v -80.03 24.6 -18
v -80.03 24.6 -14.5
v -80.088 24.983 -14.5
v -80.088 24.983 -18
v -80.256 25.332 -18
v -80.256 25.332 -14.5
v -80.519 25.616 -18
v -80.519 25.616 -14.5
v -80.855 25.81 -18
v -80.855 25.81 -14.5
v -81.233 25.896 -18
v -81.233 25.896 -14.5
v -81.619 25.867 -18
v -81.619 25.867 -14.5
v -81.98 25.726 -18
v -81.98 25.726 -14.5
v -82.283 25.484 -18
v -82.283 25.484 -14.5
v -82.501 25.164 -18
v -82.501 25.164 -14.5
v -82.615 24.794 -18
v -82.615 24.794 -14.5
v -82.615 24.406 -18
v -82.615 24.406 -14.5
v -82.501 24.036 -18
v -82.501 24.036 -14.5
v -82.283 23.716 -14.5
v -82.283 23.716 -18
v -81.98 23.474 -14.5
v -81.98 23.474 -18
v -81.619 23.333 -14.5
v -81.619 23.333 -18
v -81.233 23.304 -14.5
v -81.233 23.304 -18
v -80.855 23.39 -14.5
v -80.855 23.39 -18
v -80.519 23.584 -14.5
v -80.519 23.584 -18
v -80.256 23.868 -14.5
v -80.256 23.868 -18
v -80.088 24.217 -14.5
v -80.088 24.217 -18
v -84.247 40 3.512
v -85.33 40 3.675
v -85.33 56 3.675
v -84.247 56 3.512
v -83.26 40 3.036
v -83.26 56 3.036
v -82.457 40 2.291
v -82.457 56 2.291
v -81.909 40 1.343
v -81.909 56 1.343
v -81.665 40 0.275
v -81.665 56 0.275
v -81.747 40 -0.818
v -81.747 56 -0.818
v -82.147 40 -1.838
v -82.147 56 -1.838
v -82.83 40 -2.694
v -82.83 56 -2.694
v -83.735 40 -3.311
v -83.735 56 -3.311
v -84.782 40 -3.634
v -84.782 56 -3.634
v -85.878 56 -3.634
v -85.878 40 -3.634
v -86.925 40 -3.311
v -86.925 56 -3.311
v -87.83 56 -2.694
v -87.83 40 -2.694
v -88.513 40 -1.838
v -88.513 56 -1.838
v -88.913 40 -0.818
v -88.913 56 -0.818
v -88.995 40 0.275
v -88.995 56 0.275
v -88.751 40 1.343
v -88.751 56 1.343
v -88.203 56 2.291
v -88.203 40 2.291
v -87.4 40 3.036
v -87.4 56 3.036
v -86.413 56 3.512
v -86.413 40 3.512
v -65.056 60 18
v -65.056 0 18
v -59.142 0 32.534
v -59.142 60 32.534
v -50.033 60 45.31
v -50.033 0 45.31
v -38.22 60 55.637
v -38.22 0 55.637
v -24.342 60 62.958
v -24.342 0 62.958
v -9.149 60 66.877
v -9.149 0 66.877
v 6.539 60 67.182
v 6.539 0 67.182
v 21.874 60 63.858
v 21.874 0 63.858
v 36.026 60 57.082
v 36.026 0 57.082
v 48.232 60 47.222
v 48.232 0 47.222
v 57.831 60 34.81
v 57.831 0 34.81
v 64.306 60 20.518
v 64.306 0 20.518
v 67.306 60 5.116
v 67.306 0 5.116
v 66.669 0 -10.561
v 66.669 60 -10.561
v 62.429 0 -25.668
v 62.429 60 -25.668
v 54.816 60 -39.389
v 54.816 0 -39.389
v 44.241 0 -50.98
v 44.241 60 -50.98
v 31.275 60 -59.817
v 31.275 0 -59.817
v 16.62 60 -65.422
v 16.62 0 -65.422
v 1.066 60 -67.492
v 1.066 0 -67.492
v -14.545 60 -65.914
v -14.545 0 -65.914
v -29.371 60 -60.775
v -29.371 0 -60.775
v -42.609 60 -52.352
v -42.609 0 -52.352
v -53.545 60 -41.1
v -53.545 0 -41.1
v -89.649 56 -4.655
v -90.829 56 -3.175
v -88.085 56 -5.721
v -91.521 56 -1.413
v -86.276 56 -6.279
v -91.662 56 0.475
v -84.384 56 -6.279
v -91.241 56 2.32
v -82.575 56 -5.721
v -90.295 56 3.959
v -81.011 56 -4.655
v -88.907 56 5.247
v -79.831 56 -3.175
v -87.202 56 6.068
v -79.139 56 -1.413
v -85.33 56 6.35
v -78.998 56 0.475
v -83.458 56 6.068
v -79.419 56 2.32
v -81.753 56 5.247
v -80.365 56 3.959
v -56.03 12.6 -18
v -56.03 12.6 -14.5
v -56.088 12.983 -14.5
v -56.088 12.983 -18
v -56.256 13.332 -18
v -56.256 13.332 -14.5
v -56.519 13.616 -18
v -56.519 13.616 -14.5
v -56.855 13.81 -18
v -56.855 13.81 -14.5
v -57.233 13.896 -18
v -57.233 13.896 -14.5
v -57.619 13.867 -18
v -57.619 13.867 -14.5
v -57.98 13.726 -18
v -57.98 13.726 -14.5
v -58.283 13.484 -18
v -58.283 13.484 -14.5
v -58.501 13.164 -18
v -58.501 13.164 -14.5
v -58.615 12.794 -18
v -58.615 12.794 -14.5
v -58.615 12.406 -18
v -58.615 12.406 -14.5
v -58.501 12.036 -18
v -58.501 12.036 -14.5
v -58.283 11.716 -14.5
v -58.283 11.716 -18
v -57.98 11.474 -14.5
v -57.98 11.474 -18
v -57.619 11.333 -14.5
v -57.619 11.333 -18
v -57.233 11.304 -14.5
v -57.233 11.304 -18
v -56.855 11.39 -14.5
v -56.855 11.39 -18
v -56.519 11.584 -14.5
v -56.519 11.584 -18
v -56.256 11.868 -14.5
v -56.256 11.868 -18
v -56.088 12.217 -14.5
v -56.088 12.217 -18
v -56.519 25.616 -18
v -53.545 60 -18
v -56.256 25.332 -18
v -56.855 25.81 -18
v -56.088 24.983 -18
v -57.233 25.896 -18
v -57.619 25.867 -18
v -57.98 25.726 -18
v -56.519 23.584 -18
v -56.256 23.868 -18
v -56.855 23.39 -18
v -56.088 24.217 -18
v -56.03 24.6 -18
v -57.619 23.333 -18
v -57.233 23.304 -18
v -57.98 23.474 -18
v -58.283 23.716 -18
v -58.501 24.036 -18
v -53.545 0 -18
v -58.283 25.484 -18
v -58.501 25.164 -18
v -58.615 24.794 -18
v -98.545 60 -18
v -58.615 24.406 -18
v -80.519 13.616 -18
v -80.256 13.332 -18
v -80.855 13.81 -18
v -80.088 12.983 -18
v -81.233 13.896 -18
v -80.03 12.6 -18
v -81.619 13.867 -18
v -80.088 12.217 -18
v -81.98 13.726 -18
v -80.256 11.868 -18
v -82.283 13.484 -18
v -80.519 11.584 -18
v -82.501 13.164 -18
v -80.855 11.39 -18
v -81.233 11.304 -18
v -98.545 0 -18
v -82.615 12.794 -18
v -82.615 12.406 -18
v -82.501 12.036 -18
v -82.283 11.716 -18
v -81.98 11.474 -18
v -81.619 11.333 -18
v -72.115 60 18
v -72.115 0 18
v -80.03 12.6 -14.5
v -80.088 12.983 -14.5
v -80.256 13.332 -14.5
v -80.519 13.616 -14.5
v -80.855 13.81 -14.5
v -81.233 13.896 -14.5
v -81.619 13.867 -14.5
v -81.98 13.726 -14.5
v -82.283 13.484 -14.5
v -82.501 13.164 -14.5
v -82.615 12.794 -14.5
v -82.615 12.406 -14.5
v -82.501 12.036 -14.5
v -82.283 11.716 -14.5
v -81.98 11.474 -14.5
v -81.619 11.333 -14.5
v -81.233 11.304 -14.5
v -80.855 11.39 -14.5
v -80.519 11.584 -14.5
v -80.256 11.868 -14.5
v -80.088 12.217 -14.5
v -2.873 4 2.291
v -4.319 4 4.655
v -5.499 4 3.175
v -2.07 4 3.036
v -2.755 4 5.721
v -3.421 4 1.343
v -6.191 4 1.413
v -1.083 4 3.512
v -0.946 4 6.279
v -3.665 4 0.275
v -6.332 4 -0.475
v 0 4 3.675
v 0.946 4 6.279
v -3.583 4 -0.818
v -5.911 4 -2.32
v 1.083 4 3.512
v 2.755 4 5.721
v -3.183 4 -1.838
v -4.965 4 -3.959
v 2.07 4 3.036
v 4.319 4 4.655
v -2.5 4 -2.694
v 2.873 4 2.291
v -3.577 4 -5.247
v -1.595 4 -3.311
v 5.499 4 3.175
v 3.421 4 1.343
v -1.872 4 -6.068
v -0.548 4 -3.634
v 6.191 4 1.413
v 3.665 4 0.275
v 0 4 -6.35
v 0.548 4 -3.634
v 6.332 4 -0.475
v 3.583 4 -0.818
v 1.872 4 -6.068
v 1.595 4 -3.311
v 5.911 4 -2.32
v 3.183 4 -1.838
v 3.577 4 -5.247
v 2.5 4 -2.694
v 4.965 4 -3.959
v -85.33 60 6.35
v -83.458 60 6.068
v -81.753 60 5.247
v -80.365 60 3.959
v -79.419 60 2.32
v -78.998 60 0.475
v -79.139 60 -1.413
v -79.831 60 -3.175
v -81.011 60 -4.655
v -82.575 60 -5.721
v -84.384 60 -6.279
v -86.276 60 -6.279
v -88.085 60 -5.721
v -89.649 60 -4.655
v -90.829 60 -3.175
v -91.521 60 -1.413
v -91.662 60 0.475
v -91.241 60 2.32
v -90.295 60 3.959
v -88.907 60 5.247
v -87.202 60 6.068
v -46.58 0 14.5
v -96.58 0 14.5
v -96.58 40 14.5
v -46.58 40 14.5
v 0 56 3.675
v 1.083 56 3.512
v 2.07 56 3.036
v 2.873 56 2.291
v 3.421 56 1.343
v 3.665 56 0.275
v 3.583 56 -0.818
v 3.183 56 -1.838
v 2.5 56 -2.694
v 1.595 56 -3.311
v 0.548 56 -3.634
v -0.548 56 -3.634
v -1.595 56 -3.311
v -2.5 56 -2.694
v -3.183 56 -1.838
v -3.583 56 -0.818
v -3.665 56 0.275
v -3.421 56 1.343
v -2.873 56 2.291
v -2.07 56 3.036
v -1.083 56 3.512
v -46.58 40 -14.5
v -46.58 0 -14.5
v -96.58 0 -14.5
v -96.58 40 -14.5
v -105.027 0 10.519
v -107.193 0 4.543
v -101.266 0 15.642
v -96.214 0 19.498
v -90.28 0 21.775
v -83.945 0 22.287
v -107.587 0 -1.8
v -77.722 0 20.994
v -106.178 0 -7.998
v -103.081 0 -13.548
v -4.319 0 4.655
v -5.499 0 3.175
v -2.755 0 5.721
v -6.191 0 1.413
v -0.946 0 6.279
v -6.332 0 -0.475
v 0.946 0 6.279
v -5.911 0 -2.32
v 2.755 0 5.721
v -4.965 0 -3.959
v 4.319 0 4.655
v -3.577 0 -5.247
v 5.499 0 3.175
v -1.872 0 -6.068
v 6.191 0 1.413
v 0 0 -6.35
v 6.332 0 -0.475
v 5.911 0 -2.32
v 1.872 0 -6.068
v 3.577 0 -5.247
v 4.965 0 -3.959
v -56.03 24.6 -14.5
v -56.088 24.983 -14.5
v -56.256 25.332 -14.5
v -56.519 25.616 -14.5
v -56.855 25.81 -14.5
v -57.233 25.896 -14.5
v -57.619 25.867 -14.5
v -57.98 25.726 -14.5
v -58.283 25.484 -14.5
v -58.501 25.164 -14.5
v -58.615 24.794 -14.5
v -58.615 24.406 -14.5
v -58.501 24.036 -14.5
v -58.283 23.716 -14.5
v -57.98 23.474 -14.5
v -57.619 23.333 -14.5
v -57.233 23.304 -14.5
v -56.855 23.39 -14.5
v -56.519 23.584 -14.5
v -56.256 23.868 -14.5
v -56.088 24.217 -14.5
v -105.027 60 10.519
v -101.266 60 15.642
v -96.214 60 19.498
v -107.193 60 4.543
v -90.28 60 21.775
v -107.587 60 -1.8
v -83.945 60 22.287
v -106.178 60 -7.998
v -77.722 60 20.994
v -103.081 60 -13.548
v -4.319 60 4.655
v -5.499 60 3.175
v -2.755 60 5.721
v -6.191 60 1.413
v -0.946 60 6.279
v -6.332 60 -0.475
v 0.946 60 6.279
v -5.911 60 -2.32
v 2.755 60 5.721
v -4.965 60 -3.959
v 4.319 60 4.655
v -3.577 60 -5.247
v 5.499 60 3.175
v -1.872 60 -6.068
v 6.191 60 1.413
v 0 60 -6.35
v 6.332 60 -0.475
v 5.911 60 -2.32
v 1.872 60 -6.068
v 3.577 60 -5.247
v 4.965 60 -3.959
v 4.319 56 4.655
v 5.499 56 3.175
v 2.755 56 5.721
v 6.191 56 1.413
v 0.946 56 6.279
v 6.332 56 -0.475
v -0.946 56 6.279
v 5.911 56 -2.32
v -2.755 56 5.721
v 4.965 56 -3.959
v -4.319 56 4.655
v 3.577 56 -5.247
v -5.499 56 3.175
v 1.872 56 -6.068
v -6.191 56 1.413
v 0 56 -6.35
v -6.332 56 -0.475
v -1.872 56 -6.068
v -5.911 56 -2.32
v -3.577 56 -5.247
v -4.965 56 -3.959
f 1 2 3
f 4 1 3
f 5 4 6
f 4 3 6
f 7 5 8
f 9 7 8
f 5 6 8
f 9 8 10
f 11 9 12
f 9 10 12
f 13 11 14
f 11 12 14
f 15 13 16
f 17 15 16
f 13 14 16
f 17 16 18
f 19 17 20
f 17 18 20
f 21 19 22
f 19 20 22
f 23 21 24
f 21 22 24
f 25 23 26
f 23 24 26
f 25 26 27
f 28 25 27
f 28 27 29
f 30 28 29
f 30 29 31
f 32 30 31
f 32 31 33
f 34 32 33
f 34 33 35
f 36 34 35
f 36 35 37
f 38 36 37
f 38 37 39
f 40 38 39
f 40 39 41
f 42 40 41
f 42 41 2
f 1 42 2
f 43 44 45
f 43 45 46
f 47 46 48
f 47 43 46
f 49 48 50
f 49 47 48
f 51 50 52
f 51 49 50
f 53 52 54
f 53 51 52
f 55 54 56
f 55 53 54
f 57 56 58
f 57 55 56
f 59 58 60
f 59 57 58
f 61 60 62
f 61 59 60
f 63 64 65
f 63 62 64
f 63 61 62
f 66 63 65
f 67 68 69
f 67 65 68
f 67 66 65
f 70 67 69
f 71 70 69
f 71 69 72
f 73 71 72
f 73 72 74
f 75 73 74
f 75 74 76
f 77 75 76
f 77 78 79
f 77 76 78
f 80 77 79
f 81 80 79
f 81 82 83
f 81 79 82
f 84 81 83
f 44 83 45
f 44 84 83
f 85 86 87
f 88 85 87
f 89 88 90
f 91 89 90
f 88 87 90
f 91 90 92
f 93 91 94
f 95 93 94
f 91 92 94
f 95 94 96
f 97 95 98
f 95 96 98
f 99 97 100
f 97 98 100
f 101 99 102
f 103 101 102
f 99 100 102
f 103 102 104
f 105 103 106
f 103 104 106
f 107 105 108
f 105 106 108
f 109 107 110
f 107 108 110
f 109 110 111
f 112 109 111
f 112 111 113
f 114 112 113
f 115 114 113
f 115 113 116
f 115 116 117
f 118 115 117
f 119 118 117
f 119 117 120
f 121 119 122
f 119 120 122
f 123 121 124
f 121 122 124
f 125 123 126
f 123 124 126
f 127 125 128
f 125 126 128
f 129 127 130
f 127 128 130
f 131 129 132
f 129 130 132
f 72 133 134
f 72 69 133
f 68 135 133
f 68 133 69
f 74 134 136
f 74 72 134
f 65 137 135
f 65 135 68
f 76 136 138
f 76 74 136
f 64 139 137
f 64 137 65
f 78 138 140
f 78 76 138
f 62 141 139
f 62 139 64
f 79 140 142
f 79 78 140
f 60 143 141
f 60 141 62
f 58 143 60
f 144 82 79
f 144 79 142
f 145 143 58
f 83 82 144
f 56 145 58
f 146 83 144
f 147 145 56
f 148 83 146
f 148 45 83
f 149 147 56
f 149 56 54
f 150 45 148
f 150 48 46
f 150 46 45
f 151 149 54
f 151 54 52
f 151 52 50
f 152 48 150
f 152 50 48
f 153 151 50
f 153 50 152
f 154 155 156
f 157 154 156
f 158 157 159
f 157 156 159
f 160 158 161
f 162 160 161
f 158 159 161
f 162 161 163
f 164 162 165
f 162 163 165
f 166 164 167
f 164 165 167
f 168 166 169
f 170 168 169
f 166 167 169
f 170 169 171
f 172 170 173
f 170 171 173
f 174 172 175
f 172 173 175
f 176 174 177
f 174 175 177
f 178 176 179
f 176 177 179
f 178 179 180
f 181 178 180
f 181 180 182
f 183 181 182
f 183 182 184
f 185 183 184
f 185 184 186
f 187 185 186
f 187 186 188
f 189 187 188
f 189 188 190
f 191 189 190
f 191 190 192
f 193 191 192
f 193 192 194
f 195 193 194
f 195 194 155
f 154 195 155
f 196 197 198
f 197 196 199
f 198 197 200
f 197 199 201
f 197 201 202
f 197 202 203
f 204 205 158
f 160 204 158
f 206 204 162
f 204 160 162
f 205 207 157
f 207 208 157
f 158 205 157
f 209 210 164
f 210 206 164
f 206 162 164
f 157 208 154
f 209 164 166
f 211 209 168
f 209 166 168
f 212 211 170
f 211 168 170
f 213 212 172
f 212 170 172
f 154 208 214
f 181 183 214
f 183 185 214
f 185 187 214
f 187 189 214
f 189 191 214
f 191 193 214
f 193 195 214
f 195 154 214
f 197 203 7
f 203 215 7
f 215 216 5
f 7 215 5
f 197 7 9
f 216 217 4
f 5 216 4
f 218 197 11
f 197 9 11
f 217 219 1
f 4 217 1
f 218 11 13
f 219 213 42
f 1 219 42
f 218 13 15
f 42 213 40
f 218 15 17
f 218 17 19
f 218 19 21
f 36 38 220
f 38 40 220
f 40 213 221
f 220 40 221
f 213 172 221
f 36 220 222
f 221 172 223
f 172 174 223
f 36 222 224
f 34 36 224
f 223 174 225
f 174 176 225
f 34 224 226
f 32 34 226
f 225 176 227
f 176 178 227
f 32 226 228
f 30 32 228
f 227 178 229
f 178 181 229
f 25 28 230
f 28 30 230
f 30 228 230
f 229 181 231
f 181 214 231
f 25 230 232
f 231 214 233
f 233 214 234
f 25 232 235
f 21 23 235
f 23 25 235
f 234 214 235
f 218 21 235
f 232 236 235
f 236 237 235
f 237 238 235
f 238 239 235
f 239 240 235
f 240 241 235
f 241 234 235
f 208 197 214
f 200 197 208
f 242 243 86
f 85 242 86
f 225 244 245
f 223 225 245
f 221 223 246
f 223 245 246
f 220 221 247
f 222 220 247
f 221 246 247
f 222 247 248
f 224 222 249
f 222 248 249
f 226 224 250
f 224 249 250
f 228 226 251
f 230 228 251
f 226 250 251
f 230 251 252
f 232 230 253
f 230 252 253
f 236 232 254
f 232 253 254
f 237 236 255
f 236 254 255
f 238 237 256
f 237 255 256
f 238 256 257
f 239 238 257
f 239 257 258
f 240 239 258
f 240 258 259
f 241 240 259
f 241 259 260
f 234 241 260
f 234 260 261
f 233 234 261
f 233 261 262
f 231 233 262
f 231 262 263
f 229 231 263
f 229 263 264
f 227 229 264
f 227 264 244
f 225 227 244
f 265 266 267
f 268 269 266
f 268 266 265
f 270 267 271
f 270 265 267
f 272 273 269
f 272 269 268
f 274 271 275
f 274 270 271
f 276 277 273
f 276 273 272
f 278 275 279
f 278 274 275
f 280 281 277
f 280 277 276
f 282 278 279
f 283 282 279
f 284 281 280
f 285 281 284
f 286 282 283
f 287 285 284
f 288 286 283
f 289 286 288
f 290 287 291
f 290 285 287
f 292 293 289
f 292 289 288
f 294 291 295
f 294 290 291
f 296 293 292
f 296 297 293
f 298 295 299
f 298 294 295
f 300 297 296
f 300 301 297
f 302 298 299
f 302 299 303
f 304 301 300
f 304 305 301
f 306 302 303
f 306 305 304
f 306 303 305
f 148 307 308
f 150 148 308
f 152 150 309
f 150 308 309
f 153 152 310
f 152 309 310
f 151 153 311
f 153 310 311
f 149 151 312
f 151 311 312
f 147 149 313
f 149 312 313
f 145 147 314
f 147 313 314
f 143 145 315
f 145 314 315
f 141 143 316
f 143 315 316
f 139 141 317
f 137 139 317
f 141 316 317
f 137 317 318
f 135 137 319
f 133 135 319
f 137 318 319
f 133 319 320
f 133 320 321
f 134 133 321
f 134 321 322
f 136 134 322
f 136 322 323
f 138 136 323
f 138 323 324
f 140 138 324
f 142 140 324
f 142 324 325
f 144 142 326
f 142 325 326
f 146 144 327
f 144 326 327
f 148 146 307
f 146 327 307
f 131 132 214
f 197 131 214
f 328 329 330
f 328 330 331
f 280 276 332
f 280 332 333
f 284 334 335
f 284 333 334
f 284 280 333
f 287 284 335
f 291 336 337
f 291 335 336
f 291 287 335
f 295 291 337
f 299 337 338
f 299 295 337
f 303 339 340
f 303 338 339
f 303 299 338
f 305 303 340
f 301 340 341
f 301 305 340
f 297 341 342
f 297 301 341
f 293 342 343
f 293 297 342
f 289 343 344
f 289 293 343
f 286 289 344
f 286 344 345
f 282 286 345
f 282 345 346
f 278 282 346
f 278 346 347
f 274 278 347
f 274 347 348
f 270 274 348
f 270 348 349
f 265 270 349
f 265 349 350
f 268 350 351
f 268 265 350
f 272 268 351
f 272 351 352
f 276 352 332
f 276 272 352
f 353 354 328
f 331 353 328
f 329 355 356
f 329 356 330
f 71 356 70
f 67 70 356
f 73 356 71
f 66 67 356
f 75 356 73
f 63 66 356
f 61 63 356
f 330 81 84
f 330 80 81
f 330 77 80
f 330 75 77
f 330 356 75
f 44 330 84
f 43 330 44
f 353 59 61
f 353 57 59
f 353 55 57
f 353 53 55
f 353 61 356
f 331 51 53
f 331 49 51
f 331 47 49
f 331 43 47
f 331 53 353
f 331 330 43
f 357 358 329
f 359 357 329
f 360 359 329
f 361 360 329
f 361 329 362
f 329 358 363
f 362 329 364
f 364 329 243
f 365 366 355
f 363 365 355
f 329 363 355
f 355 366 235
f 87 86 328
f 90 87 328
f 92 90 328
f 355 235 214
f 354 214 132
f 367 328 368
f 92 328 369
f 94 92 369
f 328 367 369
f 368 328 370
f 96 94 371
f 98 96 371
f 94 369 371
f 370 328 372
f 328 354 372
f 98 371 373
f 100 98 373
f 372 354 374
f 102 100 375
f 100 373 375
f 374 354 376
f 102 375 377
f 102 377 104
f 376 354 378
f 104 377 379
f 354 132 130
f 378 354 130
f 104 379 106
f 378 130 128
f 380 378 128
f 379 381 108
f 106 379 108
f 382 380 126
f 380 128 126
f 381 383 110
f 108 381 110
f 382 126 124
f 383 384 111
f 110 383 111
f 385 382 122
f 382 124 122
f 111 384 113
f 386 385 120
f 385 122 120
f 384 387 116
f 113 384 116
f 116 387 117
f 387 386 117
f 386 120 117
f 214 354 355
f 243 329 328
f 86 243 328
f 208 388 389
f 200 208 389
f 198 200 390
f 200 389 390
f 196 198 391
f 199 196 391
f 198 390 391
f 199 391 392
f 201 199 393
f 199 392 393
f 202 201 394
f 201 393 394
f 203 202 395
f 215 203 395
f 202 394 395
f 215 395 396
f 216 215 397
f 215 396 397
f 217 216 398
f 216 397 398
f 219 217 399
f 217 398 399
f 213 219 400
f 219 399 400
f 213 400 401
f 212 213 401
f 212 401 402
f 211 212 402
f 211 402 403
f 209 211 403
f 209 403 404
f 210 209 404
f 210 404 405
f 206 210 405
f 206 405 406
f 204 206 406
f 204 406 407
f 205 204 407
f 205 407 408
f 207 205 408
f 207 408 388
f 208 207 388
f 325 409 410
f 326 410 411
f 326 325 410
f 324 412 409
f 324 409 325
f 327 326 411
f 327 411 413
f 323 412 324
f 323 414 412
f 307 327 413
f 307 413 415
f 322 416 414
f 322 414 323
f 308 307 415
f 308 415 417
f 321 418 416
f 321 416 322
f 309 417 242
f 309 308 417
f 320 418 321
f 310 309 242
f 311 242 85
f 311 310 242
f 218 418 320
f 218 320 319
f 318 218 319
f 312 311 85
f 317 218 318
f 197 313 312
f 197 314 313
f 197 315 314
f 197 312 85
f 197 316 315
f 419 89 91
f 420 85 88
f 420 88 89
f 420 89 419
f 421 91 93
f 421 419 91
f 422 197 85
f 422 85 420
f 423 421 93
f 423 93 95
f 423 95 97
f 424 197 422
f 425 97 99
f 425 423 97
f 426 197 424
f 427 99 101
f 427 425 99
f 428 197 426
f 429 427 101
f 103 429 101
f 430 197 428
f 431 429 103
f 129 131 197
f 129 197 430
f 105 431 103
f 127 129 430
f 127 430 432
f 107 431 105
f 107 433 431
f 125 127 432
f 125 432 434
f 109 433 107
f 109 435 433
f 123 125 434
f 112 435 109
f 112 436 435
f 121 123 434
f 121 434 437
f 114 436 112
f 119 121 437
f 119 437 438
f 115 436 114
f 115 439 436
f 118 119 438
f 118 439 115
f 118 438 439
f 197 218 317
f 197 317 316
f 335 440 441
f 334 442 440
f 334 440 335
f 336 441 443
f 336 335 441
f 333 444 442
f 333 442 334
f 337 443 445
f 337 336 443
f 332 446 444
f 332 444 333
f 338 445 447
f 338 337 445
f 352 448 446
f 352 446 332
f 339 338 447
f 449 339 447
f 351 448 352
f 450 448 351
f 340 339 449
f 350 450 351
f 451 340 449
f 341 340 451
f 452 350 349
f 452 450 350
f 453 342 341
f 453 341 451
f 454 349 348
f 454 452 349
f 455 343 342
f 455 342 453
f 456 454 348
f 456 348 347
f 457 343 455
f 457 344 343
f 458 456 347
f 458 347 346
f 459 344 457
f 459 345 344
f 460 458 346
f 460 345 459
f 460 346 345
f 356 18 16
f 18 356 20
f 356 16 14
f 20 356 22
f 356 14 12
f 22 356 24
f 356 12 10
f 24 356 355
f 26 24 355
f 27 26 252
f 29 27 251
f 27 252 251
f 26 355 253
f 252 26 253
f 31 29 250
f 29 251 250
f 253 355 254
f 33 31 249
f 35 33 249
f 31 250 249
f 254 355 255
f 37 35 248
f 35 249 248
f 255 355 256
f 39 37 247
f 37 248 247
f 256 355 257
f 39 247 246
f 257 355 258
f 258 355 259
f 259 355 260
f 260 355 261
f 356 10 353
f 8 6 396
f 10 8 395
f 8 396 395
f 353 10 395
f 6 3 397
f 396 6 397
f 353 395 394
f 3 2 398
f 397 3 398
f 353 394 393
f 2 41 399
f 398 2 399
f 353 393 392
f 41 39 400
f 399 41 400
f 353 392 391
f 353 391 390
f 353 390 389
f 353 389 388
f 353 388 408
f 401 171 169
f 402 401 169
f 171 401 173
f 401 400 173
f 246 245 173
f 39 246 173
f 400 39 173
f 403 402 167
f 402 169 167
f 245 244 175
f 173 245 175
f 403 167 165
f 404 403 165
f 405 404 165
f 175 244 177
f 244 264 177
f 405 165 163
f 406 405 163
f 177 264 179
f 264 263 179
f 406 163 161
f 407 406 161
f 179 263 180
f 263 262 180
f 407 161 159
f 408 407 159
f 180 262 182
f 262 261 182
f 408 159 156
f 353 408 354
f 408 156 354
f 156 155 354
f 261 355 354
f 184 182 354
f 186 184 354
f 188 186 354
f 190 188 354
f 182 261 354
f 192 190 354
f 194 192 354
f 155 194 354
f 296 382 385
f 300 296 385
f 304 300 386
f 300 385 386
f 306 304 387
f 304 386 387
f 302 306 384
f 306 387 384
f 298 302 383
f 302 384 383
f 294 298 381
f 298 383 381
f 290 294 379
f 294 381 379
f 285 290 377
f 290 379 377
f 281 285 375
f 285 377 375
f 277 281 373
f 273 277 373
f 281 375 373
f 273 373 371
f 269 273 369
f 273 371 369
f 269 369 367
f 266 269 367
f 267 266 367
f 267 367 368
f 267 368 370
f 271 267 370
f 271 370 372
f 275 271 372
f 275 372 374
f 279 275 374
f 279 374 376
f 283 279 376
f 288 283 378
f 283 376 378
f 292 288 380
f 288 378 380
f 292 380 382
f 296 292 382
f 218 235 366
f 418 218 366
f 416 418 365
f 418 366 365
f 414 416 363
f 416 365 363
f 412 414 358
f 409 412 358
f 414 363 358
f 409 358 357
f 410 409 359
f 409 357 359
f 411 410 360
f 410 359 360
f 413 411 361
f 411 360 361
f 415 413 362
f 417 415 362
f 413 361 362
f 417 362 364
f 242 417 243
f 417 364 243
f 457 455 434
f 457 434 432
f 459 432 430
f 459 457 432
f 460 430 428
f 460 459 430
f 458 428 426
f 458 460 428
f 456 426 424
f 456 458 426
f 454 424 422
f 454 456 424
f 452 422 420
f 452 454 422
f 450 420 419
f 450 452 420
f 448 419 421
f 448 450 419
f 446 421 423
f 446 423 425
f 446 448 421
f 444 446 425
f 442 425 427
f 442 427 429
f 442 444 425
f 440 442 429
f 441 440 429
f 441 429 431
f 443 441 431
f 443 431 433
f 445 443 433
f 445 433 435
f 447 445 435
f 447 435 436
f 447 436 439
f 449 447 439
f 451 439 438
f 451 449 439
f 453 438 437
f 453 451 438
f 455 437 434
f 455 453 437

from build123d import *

# Parameters (mm, degrees)
ESQUISSE1_R             = 3.675
BOSS_EXTRU_1_DEPTH      = 60
ESQUISSE2_W             = 50
ESQUISSE2_H             = 29
ENL_V_MAT_EXTRU_1_DEPTH = 40
D_GAGEMENT_M21_D        = 2.6
D_GAGEMENT_M21_DEPTH    = 3.5
ESQUISSE4_R             = 6.35
ENL_V_MAT_EXTRU_2_DEPTH = 4
ENL_V_START             = -4
ESQUISSE5_R             = 6.35
ENL_V_MAT_EXTRU_3_DEPTH = 4
ESQUISSE6_R             = 6.35
ENL_V_MAT_EXTRU_4_DEPTH = 4


with BuildPart() as part:
    # Esquisse1 → Boss.-Extru.1 (new body)
    with BuildSketch(Plane(origin=(0, 0, 0), x_dir=(1, 0, 0), z_dir=(0, 1, 0))):
        with BuildLine():
            ThreePointArc((-98.54472285, 18), (-103.33, -13.21472285), (-72.11527715, -18))
            Line((-72.11527715, -18), (-65.055745327, -18))
            ThreePointArc((-65.055745327, -18), (66.254971265, -12.904603158), (-53.54472285, 41.100032298))
            Line((-53.54472285, 41.100032298), (-53.54472285, 18))
            Line((-53.54472285, 18), (-98.54472285, 18))
        make_face()
        with Locations(Location((-85.33, 0, 0), (0, 0, 270))):
            Circle(ESQUISSE1_R, mode=Mode.SUBTRACT)
        with Locations(Location((0, 0, 0), (0, 0, 270))):
            Circle(ESQUISSE1_R, mode=Mode.SUBTRACT)
    extrude(amount=BOSS_EXTRU_1_DEPTH)

    # Esquisse2 → Enlèv. mat.-Extru.1 (cut)
    with BuildSketch(Plane.XZ):
        with Locations((-71.58, 0)):
            Rectangle(ESQUISSE2_W, ESQUISSE2_H)
    extrude(amount=-ENL_V_MAT_EXTRU_1_DEPTH, mode=Mode.SUBTRACT)

    # Dégagement M21
    with Locations(Plane(origin=(-57.33, 24.6, -18), x_dir=(-1, 0, 0), z_dir=(0, 0, -1))):
        with Locations((0, 0), (24, 0), (24, -12), (0, -12)):
            Hole(D_GAGEMENT_M21_D / 2, depth=D_GAGEMENT_M21_DEPTH)

    # Esquisse4 → Enlèv. mat.-Extru.2 (cut)
    with BuildSketch(Plane.XZ):
        with Locations(Location((0, 0, 0), (0, 0, 270))):
            Circle(ESQUISSE4_R)
    extrude(amount=-ENL_V_MAT_EXTRU_2_DEPTH, mode=Mode.SUBTRACT)

    # Esquisse5 → Enlèv. mat.-Extru.3 (cut)
    with BuildSketch(Plane(origin=(0, 60, 0), x_dir=(1, 0, 0), z_dir=(0, 1, 0)).offset(ENL_V_START)):
        with Locations(Location((0, 0, 0), (0, 0, 90))):
            Circle(ESQUISSE5_R)
    extrude(amount=ENL_V_MAT_EXTRU_3_DEPTH, mode=Mode.SUBTRACT)

    # Esquisse6 → Enlèv. mat.-Extru.4 (cut)
    with BuildSketch(Plane(origin=(0, 60, 0), x_dir=(1, 0, 0), z_dir=(0, 1, 0))):
        with Locations(Location((-85.33, 0, 0), (0, 0, 270))):
            Circle(ESQUISSE6_R)
    extrude(amount=-ENL_V_MAT_EXTRU_4_DEPTH, mode=Mode.SUBTRACT)


solid = part.part
